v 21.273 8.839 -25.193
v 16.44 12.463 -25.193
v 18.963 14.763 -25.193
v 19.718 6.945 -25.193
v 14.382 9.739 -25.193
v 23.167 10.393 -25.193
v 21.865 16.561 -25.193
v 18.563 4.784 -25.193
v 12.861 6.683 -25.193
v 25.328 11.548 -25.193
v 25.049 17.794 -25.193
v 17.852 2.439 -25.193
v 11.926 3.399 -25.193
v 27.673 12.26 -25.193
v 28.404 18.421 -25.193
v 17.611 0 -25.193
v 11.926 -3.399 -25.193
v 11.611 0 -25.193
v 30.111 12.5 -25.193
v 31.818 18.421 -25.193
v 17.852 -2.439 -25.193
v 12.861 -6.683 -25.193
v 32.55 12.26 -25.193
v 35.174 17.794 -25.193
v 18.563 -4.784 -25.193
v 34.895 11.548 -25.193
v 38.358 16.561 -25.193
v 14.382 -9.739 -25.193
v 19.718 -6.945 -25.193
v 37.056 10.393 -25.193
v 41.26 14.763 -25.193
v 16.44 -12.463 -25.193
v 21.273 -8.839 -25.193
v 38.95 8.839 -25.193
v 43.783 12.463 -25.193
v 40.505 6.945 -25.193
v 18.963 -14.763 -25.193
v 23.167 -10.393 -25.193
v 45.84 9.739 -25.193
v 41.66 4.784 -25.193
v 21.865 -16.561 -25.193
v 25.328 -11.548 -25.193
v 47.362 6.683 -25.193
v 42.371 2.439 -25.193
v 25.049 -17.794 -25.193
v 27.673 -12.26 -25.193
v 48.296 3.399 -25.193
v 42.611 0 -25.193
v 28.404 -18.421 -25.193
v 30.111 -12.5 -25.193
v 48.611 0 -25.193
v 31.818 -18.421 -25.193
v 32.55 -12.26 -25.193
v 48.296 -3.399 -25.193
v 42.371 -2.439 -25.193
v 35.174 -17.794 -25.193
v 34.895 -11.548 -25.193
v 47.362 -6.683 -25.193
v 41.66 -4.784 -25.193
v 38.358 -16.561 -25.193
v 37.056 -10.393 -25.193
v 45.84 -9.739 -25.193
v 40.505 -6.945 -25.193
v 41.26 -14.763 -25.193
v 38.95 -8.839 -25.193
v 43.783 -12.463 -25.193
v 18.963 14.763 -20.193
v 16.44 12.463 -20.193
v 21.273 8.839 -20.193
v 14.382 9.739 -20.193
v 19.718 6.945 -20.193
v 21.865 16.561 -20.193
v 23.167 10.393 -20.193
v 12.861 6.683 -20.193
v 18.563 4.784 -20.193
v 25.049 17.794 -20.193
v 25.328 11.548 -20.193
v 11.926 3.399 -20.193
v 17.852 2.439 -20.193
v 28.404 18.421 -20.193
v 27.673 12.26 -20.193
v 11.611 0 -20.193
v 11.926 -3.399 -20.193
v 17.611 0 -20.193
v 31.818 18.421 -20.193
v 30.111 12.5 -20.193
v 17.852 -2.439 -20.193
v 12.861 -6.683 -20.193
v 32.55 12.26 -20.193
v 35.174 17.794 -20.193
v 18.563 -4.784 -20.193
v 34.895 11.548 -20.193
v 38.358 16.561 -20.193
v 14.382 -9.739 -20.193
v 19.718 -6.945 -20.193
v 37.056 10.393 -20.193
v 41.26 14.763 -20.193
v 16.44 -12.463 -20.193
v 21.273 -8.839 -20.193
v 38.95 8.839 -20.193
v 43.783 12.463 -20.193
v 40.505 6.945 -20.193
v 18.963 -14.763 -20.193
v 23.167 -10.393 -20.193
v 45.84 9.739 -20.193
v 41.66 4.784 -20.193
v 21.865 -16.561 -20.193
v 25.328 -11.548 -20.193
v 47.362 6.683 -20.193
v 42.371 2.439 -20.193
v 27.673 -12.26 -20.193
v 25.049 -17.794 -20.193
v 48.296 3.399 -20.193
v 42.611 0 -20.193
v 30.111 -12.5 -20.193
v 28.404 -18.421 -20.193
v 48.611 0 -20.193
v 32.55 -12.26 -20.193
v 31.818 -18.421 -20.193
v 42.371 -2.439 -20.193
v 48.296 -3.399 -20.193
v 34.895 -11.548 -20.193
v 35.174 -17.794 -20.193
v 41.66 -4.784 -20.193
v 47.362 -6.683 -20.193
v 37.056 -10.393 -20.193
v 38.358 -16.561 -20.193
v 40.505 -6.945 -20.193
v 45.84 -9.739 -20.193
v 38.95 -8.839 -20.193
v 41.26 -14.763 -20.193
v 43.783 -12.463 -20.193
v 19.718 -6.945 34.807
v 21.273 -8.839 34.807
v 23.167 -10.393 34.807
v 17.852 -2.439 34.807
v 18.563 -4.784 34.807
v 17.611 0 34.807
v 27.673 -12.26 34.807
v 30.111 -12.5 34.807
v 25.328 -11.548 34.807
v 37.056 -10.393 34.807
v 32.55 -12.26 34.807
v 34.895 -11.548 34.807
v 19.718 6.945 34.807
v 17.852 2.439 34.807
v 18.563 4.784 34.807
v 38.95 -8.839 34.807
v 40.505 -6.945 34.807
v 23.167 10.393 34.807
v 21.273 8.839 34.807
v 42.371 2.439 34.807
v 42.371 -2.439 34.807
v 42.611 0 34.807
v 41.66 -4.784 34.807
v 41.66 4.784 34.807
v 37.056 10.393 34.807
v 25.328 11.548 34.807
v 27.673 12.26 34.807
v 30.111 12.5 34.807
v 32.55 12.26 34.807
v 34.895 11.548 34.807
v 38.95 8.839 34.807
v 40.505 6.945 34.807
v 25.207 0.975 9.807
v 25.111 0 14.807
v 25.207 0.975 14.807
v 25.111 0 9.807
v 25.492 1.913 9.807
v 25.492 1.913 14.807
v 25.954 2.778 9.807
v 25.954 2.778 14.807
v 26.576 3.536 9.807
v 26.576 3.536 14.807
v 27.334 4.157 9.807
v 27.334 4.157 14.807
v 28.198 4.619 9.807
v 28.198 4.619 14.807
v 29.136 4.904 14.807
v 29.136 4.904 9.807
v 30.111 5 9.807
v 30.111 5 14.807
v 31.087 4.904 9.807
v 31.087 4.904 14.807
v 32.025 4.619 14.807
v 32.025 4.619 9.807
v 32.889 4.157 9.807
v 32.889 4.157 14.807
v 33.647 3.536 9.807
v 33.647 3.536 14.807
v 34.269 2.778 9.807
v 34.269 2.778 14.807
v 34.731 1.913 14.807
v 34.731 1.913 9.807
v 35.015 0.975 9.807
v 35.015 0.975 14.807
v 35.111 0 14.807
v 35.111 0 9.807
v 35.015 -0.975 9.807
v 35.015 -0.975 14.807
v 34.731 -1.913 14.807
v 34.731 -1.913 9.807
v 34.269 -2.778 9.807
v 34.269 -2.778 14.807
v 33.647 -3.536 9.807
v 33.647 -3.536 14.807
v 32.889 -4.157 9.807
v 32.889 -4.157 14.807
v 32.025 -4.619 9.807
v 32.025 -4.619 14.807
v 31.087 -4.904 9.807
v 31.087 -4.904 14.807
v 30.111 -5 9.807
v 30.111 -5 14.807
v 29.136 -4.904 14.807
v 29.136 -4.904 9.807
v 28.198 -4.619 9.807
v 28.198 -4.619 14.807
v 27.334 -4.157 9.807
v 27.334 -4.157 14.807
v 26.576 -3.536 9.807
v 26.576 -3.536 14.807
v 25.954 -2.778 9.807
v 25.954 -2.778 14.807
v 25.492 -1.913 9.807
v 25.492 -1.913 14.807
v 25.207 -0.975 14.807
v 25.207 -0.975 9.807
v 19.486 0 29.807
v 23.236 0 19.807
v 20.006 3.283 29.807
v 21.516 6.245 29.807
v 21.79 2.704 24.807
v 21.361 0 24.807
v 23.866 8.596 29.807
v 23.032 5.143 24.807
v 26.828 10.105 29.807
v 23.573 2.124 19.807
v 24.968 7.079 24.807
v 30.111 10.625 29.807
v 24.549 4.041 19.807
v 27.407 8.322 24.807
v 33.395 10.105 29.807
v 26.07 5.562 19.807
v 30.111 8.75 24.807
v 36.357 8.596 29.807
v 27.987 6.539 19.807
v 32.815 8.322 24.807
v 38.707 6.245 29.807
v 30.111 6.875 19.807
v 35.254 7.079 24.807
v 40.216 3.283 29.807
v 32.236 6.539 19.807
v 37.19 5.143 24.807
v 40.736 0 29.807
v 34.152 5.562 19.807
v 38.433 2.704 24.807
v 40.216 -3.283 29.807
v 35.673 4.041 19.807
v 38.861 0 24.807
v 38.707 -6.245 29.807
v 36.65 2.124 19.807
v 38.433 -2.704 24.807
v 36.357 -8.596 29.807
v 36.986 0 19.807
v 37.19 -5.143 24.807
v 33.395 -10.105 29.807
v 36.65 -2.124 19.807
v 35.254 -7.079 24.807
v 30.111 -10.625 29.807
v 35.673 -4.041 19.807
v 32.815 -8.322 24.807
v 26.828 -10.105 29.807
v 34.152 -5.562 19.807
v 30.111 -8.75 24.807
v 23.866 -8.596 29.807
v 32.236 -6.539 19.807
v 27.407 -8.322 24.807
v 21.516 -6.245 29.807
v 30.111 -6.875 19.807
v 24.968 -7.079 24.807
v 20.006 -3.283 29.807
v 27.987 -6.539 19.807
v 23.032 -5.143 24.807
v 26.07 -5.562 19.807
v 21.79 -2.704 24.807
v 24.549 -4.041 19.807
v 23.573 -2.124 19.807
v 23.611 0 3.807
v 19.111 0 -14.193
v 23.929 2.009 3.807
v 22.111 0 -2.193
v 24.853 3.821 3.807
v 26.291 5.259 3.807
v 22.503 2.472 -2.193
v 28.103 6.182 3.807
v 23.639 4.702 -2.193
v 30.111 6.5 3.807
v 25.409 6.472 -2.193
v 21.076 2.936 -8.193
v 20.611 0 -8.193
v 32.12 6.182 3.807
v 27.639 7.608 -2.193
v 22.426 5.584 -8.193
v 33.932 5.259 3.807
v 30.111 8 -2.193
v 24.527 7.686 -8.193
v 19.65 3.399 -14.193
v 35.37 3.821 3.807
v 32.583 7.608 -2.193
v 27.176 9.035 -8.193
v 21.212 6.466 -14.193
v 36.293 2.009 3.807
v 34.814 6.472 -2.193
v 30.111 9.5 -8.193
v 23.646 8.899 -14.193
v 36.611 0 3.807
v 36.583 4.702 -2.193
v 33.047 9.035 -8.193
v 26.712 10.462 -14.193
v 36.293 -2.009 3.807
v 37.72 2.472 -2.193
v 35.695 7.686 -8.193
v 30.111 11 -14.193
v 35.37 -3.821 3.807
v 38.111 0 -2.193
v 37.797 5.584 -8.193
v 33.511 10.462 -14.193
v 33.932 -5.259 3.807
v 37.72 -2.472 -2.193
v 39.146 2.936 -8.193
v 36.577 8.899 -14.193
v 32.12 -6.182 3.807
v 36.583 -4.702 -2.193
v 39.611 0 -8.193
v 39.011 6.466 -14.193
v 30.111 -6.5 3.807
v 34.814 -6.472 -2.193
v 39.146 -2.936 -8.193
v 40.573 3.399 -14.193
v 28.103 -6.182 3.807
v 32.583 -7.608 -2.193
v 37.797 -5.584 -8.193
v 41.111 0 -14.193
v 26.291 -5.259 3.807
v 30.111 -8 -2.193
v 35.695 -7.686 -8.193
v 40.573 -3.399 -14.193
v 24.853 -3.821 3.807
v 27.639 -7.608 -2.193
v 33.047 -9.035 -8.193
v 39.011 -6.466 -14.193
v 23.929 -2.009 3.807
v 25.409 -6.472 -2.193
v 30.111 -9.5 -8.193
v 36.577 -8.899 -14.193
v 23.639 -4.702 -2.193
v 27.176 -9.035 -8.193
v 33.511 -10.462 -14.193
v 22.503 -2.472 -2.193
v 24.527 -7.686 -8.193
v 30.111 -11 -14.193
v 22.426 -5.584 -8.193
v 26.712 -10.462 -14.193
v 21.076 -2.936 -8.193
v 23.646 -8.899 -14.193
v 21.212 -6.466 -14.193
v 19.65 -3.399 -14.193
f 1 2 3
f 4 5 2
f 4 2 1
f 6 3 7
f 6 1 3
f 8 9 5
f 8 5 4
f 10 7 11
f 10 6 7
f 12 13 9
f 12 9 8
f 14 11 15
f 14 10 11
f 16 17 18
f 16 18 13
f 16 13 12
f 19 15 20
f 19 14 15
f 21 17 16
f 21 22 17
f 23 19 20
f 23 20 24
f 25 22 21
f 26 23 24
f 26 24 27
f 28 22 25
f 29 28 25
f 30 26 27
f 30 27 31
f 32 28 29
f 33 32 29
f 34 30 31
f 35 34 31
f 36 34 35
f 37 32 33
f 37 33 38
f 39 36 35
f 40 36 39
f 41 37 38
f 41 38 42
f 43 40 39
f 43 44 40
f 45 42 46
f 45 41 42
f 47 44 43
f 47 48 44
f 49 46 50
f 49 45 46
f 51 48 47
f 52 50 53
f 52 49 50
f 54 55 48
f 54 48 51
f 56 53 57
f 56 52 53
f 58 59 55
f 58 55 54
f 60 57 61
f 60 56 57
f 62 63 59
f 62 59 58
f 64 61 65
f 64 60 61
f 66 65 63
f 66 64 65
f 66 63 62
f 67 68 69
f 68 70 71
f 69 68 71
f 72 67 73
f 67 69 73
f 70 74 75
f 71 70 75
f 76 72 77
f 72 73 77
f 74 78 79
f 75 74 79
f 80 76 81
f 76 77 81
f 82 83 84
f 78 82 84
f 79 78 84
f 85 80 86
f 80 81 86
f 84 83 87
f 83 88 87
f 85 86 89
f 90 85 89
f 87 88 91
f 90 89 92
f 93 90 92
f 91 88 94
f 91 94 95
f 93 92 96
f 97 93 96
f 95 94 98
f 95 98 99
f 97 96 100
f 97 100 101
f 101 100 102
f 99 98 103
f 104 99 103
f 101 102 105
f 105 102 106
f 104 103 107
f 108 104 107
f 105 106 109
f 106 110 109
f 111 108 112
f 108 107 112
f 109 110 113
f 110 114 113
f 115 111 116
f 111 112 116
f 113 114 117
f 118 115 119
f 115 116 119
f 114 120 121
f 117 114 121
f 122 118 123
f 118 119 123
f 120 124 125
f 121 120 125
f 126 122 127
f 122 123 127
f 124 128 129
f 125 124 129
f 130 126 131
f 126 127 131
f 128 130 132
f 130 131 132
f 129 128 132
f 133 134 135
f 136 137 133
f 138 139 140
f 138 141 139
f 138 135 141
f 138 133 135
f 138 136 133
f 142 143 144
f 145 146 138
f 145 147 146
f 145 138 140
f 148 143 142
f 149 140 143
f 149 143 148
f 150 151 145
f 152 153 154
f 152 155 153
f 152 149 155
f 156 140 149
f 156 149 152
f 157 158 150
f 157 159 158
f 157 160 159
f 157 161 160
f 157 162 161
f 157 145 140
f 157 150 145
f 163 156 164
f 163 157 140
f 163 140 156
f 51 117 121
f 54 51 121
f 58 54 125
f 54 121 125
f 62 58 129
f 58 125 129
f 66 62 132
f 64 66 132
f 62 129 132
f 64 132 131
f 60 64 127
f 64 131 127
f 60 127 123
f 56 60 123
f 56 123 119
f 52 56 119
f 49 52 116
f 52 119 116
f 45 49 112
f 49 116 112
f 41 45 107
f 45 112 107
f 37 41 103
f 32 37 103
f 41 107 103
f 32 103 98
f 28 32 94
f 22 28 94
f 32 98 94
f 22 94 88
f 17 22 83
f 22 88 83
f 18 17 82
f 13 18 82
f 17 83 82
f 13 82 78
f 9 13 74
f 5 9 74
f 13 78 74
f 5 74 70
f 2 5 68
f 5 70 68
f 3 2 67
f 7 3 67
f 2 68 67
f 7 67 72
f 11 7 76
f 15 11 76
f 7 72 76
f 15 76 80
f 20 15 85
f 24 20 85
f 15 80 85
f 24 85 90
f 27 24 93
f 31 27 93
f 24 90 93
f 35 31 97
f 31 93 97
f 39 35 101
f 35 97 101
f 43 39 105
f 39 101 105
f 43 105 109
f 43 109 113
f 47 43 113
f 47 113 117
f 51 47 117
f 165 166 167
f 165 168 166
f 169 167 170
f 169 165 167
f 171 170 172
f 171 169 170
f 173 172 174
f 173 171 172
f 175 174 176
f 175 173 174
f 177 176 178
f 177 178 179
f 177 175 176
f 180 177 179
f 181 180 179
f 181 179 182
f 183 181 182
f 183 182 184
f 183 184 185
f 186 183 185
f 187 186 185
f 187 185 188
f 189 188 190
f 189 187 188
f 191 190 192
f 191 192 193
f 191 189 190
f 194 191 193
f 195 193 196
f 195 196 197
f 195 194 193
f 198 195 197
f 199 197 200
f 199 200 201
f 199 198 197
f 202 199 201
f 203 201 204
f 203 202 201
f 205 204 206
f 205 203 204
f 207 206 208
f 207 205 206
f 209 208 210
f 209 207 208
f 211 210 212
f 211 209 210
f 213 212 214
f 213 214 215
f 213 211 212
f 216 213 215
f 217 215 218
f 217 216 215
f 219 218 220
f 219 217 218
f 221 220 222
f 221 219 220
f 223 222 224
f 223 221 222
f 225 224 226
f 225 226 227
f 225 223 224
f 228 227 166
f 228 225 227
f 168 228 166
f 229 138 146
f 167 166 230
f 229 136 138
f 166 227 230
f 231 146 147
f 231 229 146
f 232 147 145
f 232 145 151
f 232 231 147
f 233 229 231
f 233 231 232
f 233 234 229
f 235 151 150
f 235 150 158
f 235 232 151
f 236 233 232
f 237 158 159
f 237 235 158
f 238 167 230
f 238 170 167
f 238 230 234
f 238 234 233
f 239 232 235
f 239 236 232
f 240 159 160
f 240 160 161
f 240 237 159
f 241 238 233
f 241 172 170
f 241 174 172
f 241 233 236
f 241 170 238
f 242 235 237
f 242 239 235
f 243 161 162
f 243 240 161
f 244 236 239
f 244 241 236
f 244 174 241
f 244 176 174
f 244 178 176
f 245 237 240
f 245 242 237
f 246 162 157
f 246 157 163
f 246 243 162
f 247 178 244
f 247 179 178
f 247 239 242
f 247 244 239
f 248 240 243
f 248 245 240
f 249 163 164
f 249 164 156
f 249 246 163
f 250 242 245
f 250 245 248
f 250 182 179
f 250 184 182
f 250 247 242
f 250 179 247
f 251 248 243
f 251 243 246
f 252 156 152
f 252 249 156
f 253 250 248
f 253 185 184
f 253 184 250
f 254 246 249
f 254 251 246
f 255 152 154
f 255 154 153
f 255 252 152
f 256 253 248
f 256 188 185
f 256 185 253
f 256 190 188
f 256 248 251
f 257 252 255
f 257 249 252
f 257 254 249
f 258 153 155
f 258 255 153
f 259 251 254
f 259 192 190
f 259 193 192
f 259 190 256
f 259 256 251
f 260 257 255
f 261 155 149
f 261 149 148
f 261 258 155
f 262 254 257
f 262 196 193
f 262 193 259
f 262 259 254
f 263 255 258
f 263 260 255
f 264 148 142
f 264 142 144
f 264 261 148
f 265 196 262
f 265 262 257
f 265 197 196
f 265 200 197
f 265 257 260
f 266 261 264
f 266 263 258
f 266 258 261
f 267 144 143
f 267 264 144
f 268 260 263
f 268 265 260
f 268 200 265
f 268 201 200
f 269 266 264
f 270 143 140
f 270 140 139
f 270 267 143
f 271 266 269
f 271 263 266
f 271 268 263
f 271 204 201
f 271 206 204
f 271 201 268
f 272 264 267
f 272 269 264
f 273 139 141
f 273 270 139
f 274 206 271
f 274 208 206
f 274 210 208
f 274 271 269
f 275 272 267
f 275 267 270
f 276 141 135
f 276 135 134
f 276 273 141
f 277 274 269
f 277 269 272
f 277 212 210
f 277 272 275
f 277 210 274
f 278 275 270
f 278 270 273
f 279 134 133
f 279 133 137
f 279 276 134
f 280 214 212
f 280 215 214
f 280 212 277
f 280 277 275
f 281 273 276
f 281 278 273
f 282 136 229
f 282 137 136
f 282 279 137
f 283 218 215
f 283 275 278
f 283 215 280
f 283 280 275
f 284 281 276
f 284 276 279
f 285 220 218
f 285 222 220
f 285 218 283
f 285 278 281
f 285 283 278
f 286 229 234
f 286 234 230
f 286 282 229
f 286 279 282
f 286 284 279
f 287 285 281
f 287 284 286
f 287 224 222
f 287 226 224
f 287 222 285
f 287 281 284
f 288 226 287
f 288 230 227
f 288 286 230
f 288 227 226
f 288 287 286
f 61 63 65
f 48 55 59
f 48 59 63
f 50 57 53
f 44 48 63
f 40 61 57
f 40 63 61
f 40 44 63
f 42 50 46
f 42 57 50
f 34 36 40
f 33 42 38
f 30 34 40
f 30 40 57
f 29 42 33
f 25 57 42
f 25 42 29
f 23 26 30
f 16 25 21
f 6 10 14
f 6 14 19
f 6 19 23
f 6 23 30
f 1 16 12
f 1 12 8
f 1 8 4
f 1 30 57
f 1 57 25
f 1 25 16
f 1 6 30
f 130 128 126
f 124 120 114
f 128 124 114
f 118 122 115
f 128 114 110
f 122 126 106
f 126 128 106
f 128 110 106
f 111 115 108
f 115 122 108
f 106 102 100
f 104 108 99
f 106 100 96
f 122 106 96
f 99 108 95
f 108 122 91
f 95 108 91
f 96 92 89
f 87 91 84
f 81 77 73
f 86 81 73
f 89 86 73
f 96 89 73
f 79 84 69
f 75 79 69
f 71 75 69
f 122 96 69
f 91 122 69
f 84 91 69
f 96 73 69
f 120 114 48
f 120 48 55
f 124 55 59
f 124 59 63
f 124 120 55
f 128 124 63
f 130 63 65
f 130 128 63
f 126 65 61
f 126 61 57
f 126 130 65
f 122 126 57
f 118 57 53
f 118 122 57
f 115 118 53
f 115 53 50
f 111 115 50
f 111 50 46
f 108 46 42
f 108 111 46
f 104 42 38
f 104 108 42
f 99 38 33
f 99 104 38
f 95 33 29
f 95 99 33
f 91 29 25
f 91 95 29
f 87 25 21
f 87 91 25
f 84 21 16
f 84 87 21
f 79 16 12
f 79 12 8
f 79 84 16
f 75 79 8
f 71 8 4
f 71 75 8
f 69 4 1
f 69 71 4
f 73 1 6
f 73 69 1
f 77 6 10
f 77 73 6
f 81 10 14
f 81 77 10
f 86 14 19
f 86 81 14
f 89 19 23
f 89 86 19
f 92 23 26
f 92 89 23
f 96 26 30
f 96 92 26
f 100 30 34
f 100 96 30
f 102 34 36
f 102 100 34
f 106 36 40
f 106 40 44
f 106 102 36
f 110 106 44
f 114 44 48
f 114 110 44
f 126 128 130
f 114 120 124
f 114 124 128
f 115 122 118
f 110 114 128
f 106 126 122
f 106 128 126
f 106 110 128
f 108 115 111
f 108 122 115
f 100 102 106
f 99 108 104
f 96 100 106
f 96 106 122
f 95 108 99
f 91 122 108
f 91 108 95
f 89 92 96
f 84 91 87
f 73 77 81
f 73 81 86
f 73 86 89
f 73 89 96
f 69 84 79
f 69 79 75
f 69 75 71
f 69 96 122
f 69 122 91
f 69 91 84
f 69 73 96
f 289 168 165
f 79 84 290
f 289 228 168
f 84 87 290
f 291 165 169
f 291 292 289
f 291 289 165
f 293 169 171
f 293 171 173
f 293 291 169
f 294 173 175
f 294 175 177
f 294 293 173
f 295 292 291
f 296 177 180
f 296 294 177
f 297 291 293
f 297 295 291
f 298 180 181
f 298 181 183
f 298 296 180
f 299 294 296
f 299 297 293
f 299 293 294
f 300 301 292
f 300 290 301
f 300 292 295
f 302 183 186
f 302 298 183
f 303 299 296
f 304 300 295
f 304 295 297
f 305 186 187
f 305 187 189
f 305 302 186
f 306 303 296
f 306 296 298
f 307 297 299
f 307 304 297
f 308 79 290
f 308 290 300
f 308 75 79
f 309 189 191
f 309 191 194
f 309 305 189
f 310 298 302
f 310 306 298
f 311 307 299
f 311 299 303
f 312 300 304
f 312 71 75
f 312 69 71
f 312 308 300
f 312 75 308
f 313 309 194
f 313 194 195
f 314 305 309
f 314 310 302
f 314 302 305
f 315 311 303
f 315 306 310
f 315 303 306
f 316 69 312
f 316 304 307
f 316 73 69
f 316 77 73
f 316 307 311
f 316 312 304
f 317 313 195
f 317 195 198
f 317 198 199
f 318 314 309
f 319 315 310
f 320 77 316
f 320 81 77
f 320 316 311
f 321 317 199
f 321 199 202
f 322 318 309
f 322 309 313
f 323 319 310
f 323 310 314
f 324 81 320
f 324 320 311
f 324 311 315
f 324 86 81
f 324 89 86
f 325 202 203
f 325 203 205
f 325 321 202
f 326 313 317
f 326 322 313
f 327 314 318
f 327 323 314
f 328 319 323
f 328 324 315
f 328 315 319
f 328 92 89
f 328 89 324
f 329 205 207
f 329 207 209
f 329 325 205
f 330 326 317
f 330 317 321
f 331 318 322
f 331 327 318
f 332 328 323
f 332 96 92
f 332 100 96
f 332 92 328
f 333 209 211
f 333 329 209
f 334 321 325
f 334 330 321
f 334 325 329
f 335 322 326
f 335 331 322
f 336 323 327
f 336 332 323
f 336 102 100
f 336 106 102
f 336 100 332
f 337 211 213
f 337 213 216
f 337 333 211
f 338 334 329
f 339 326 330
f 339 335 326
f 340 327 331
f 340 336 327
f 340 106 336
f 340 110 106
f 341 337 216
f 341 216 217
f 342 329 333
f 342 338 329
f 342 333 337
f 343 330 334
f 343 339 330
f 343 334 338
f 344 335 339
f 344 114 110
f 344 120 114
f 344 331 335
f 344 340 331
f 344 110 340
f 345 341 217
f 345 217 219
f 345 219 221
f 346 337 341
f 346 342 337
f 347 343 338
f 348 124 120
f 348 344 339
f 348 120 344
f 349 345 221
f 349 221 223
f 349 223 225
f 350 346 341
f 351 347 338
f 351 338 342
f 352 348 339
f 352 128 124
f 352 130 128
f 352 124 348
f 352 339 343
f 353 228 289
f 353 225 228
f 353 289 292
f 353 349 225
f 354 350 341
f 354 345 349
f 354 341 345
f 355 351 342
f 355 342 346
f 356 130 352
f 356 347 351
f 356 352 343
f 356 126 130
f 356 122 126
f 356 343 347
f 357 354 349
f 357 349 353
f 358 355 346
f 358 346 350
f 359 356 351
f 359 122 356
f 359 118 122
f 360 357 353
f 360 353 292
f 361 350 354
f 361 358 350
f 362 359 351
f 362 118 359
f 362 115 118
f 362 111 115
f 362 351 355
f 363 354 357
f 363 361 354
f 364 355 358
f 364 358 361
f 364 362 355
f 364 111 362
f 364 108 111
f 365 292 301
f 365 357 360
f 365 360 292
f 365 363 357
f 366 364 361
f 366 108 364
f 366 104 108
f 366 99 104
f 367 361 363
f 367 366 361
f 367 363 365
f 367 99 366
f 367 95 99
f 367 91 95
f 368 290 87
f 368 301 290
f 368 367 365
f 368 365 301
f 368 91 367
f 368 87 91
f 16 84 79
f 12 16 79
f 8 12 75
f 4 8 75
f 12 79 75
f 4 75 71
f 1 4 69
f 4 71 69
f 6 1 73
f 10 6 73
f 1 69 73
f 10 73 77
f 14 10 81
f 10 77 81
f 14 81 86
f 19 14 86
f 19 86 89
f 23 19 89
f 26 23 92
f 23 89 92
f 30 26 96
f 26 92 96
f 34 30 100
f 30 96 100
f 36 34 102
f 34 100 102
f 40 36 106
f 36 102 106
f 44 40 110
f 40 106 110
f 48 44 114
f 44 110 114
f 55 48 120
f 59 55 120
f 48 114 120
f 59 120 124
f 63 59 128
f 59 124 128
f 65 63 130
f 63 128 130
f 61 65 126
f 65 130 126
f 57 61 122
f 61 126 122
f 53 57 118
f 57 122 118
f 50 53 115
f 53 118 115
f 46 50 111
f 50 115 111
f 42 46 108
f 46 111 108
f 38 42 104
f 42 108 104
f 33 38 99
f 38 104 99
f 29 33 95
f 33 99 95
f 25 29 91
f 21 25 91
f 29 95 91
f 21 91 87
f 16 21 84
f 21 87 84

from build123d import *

# Parameters (mm, degrees)
F0_W     = 5
F0_H     = 1.25
F0_H_2   = 2.5
F2_R     = 18.5
F2_R_2   = 12.5
F3_DEPTH = 5
F4_DEPTH = 5


with BuildPart() as f1:
    # F0 (on Front) → F1 (revolve)
    with BuildSketch(Plane.XZ):
        Polygon((25.11136204, 9.8067230731), (17.61136204, -20.1932769269), (30.11136204, -20.1932769269), (30.11136204, 9.8067230731), align=None)
        Polygon((17.61136204, 34.8067230731), (25.11136204, 14.8067230731), (30.11136204, 14.8067230731), (30.11136204, 34.8067230731), align=None)
        with Locations((27.61136204, 10.4317230731)):
            Rectangle(F0_W, F0_H)
        with Locations((27.61136204, 12.3067230731)):
            Rectangle(F0_W, F0_H_2)
        with Locations((27.61136204, 14.1817230731)):
            Rectangle(F0_W, F0_H)
    revolve(axis=Axis((30.11136204, 0, 14.1817230731), (0, 0, -1)))


with BuildPart() as f3:
    # F2 (on face) → F3 (new body)
    with BuildSketch(Plane(origin=(0, 0, -20.1932769269), x_dir=(1, 0, 0), z_dir=(0, 0, -1))):
        with Locations((30.11136204, 0)):
            Circle(F2_R)
        with Locations((30.11136204, 0)):
            Circle(F2_R_2, mode=Mode.SUBTRACT)
    extrude(amount=F3_DEPTH)


with BuildPart() as f4:
    # F4 (new): a face of the model
    f4_faces = [f1.part.faces().sort_by_distance(p)[0] for p in [
        (30.11136204, 0, -20.1932769269),
    ]]
    extrude(f4_faces, amount=F4_DEPTH)


solid = Compound([f1.part, f3.part, f4.part])
